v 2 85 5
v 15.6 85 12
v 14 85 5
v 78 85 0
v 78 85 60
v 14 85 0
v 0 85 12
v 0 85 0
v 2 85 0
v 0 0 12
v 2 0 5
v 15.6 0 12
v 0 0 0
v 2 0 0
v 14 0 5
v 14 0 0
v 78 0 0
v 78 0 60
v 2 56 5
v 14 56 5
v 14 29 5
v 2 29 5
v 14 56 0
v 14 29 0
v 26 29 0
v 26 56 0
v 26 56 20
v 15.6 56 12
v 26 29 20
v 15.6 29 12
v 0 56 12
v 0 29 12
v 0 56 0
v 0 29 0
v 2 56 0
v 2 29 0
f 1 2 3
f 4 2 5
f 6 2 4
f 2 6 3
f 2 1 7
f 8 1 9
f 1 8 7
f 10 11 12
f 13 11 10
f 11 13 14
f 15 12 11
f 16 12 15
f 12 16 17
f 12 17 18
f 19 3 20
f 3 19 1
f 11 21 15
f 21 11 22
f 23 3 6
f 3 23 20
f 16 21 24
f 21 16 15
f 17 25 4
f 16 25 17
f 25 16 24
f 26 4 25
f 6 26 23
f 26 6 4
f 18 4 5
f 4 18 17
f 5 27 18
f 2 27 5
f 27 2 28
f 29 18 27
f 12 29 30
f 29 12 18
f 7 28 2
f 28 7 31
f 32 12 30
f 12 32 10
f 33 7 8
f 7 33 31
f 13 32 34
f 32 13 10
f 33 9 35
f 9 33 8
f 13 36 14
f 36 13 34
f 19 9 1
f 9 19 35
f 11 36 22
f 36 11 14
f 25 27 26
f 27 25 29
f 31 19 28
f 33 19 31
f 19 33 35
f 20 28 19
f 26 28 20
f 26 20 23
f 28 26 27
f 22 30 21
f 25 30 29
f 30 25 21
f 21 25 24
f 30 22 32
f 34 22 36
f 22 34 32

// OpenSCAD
// Compact Redmi 9 phone stand, adapted from the provided small STL.
// Depth X=78 mm, width Y=85 mm, height Z=60 mm.
// Center cable opening 27 mm, two retained front lips.
module body() {
    translate([0, 85, 0]) rotate([90, 0, 0])
        linear_extrude(height=85, convexity=10)
            polygon(points=[
                [0,0], [2,0], [2,5], [14,5], [14,0],
                [78,0], [78,60], [15.6,12], [0,12]
            ]);
}
difference() {
    body();
    translate([-1,29,-1]) cube([27,27,32]);
}
